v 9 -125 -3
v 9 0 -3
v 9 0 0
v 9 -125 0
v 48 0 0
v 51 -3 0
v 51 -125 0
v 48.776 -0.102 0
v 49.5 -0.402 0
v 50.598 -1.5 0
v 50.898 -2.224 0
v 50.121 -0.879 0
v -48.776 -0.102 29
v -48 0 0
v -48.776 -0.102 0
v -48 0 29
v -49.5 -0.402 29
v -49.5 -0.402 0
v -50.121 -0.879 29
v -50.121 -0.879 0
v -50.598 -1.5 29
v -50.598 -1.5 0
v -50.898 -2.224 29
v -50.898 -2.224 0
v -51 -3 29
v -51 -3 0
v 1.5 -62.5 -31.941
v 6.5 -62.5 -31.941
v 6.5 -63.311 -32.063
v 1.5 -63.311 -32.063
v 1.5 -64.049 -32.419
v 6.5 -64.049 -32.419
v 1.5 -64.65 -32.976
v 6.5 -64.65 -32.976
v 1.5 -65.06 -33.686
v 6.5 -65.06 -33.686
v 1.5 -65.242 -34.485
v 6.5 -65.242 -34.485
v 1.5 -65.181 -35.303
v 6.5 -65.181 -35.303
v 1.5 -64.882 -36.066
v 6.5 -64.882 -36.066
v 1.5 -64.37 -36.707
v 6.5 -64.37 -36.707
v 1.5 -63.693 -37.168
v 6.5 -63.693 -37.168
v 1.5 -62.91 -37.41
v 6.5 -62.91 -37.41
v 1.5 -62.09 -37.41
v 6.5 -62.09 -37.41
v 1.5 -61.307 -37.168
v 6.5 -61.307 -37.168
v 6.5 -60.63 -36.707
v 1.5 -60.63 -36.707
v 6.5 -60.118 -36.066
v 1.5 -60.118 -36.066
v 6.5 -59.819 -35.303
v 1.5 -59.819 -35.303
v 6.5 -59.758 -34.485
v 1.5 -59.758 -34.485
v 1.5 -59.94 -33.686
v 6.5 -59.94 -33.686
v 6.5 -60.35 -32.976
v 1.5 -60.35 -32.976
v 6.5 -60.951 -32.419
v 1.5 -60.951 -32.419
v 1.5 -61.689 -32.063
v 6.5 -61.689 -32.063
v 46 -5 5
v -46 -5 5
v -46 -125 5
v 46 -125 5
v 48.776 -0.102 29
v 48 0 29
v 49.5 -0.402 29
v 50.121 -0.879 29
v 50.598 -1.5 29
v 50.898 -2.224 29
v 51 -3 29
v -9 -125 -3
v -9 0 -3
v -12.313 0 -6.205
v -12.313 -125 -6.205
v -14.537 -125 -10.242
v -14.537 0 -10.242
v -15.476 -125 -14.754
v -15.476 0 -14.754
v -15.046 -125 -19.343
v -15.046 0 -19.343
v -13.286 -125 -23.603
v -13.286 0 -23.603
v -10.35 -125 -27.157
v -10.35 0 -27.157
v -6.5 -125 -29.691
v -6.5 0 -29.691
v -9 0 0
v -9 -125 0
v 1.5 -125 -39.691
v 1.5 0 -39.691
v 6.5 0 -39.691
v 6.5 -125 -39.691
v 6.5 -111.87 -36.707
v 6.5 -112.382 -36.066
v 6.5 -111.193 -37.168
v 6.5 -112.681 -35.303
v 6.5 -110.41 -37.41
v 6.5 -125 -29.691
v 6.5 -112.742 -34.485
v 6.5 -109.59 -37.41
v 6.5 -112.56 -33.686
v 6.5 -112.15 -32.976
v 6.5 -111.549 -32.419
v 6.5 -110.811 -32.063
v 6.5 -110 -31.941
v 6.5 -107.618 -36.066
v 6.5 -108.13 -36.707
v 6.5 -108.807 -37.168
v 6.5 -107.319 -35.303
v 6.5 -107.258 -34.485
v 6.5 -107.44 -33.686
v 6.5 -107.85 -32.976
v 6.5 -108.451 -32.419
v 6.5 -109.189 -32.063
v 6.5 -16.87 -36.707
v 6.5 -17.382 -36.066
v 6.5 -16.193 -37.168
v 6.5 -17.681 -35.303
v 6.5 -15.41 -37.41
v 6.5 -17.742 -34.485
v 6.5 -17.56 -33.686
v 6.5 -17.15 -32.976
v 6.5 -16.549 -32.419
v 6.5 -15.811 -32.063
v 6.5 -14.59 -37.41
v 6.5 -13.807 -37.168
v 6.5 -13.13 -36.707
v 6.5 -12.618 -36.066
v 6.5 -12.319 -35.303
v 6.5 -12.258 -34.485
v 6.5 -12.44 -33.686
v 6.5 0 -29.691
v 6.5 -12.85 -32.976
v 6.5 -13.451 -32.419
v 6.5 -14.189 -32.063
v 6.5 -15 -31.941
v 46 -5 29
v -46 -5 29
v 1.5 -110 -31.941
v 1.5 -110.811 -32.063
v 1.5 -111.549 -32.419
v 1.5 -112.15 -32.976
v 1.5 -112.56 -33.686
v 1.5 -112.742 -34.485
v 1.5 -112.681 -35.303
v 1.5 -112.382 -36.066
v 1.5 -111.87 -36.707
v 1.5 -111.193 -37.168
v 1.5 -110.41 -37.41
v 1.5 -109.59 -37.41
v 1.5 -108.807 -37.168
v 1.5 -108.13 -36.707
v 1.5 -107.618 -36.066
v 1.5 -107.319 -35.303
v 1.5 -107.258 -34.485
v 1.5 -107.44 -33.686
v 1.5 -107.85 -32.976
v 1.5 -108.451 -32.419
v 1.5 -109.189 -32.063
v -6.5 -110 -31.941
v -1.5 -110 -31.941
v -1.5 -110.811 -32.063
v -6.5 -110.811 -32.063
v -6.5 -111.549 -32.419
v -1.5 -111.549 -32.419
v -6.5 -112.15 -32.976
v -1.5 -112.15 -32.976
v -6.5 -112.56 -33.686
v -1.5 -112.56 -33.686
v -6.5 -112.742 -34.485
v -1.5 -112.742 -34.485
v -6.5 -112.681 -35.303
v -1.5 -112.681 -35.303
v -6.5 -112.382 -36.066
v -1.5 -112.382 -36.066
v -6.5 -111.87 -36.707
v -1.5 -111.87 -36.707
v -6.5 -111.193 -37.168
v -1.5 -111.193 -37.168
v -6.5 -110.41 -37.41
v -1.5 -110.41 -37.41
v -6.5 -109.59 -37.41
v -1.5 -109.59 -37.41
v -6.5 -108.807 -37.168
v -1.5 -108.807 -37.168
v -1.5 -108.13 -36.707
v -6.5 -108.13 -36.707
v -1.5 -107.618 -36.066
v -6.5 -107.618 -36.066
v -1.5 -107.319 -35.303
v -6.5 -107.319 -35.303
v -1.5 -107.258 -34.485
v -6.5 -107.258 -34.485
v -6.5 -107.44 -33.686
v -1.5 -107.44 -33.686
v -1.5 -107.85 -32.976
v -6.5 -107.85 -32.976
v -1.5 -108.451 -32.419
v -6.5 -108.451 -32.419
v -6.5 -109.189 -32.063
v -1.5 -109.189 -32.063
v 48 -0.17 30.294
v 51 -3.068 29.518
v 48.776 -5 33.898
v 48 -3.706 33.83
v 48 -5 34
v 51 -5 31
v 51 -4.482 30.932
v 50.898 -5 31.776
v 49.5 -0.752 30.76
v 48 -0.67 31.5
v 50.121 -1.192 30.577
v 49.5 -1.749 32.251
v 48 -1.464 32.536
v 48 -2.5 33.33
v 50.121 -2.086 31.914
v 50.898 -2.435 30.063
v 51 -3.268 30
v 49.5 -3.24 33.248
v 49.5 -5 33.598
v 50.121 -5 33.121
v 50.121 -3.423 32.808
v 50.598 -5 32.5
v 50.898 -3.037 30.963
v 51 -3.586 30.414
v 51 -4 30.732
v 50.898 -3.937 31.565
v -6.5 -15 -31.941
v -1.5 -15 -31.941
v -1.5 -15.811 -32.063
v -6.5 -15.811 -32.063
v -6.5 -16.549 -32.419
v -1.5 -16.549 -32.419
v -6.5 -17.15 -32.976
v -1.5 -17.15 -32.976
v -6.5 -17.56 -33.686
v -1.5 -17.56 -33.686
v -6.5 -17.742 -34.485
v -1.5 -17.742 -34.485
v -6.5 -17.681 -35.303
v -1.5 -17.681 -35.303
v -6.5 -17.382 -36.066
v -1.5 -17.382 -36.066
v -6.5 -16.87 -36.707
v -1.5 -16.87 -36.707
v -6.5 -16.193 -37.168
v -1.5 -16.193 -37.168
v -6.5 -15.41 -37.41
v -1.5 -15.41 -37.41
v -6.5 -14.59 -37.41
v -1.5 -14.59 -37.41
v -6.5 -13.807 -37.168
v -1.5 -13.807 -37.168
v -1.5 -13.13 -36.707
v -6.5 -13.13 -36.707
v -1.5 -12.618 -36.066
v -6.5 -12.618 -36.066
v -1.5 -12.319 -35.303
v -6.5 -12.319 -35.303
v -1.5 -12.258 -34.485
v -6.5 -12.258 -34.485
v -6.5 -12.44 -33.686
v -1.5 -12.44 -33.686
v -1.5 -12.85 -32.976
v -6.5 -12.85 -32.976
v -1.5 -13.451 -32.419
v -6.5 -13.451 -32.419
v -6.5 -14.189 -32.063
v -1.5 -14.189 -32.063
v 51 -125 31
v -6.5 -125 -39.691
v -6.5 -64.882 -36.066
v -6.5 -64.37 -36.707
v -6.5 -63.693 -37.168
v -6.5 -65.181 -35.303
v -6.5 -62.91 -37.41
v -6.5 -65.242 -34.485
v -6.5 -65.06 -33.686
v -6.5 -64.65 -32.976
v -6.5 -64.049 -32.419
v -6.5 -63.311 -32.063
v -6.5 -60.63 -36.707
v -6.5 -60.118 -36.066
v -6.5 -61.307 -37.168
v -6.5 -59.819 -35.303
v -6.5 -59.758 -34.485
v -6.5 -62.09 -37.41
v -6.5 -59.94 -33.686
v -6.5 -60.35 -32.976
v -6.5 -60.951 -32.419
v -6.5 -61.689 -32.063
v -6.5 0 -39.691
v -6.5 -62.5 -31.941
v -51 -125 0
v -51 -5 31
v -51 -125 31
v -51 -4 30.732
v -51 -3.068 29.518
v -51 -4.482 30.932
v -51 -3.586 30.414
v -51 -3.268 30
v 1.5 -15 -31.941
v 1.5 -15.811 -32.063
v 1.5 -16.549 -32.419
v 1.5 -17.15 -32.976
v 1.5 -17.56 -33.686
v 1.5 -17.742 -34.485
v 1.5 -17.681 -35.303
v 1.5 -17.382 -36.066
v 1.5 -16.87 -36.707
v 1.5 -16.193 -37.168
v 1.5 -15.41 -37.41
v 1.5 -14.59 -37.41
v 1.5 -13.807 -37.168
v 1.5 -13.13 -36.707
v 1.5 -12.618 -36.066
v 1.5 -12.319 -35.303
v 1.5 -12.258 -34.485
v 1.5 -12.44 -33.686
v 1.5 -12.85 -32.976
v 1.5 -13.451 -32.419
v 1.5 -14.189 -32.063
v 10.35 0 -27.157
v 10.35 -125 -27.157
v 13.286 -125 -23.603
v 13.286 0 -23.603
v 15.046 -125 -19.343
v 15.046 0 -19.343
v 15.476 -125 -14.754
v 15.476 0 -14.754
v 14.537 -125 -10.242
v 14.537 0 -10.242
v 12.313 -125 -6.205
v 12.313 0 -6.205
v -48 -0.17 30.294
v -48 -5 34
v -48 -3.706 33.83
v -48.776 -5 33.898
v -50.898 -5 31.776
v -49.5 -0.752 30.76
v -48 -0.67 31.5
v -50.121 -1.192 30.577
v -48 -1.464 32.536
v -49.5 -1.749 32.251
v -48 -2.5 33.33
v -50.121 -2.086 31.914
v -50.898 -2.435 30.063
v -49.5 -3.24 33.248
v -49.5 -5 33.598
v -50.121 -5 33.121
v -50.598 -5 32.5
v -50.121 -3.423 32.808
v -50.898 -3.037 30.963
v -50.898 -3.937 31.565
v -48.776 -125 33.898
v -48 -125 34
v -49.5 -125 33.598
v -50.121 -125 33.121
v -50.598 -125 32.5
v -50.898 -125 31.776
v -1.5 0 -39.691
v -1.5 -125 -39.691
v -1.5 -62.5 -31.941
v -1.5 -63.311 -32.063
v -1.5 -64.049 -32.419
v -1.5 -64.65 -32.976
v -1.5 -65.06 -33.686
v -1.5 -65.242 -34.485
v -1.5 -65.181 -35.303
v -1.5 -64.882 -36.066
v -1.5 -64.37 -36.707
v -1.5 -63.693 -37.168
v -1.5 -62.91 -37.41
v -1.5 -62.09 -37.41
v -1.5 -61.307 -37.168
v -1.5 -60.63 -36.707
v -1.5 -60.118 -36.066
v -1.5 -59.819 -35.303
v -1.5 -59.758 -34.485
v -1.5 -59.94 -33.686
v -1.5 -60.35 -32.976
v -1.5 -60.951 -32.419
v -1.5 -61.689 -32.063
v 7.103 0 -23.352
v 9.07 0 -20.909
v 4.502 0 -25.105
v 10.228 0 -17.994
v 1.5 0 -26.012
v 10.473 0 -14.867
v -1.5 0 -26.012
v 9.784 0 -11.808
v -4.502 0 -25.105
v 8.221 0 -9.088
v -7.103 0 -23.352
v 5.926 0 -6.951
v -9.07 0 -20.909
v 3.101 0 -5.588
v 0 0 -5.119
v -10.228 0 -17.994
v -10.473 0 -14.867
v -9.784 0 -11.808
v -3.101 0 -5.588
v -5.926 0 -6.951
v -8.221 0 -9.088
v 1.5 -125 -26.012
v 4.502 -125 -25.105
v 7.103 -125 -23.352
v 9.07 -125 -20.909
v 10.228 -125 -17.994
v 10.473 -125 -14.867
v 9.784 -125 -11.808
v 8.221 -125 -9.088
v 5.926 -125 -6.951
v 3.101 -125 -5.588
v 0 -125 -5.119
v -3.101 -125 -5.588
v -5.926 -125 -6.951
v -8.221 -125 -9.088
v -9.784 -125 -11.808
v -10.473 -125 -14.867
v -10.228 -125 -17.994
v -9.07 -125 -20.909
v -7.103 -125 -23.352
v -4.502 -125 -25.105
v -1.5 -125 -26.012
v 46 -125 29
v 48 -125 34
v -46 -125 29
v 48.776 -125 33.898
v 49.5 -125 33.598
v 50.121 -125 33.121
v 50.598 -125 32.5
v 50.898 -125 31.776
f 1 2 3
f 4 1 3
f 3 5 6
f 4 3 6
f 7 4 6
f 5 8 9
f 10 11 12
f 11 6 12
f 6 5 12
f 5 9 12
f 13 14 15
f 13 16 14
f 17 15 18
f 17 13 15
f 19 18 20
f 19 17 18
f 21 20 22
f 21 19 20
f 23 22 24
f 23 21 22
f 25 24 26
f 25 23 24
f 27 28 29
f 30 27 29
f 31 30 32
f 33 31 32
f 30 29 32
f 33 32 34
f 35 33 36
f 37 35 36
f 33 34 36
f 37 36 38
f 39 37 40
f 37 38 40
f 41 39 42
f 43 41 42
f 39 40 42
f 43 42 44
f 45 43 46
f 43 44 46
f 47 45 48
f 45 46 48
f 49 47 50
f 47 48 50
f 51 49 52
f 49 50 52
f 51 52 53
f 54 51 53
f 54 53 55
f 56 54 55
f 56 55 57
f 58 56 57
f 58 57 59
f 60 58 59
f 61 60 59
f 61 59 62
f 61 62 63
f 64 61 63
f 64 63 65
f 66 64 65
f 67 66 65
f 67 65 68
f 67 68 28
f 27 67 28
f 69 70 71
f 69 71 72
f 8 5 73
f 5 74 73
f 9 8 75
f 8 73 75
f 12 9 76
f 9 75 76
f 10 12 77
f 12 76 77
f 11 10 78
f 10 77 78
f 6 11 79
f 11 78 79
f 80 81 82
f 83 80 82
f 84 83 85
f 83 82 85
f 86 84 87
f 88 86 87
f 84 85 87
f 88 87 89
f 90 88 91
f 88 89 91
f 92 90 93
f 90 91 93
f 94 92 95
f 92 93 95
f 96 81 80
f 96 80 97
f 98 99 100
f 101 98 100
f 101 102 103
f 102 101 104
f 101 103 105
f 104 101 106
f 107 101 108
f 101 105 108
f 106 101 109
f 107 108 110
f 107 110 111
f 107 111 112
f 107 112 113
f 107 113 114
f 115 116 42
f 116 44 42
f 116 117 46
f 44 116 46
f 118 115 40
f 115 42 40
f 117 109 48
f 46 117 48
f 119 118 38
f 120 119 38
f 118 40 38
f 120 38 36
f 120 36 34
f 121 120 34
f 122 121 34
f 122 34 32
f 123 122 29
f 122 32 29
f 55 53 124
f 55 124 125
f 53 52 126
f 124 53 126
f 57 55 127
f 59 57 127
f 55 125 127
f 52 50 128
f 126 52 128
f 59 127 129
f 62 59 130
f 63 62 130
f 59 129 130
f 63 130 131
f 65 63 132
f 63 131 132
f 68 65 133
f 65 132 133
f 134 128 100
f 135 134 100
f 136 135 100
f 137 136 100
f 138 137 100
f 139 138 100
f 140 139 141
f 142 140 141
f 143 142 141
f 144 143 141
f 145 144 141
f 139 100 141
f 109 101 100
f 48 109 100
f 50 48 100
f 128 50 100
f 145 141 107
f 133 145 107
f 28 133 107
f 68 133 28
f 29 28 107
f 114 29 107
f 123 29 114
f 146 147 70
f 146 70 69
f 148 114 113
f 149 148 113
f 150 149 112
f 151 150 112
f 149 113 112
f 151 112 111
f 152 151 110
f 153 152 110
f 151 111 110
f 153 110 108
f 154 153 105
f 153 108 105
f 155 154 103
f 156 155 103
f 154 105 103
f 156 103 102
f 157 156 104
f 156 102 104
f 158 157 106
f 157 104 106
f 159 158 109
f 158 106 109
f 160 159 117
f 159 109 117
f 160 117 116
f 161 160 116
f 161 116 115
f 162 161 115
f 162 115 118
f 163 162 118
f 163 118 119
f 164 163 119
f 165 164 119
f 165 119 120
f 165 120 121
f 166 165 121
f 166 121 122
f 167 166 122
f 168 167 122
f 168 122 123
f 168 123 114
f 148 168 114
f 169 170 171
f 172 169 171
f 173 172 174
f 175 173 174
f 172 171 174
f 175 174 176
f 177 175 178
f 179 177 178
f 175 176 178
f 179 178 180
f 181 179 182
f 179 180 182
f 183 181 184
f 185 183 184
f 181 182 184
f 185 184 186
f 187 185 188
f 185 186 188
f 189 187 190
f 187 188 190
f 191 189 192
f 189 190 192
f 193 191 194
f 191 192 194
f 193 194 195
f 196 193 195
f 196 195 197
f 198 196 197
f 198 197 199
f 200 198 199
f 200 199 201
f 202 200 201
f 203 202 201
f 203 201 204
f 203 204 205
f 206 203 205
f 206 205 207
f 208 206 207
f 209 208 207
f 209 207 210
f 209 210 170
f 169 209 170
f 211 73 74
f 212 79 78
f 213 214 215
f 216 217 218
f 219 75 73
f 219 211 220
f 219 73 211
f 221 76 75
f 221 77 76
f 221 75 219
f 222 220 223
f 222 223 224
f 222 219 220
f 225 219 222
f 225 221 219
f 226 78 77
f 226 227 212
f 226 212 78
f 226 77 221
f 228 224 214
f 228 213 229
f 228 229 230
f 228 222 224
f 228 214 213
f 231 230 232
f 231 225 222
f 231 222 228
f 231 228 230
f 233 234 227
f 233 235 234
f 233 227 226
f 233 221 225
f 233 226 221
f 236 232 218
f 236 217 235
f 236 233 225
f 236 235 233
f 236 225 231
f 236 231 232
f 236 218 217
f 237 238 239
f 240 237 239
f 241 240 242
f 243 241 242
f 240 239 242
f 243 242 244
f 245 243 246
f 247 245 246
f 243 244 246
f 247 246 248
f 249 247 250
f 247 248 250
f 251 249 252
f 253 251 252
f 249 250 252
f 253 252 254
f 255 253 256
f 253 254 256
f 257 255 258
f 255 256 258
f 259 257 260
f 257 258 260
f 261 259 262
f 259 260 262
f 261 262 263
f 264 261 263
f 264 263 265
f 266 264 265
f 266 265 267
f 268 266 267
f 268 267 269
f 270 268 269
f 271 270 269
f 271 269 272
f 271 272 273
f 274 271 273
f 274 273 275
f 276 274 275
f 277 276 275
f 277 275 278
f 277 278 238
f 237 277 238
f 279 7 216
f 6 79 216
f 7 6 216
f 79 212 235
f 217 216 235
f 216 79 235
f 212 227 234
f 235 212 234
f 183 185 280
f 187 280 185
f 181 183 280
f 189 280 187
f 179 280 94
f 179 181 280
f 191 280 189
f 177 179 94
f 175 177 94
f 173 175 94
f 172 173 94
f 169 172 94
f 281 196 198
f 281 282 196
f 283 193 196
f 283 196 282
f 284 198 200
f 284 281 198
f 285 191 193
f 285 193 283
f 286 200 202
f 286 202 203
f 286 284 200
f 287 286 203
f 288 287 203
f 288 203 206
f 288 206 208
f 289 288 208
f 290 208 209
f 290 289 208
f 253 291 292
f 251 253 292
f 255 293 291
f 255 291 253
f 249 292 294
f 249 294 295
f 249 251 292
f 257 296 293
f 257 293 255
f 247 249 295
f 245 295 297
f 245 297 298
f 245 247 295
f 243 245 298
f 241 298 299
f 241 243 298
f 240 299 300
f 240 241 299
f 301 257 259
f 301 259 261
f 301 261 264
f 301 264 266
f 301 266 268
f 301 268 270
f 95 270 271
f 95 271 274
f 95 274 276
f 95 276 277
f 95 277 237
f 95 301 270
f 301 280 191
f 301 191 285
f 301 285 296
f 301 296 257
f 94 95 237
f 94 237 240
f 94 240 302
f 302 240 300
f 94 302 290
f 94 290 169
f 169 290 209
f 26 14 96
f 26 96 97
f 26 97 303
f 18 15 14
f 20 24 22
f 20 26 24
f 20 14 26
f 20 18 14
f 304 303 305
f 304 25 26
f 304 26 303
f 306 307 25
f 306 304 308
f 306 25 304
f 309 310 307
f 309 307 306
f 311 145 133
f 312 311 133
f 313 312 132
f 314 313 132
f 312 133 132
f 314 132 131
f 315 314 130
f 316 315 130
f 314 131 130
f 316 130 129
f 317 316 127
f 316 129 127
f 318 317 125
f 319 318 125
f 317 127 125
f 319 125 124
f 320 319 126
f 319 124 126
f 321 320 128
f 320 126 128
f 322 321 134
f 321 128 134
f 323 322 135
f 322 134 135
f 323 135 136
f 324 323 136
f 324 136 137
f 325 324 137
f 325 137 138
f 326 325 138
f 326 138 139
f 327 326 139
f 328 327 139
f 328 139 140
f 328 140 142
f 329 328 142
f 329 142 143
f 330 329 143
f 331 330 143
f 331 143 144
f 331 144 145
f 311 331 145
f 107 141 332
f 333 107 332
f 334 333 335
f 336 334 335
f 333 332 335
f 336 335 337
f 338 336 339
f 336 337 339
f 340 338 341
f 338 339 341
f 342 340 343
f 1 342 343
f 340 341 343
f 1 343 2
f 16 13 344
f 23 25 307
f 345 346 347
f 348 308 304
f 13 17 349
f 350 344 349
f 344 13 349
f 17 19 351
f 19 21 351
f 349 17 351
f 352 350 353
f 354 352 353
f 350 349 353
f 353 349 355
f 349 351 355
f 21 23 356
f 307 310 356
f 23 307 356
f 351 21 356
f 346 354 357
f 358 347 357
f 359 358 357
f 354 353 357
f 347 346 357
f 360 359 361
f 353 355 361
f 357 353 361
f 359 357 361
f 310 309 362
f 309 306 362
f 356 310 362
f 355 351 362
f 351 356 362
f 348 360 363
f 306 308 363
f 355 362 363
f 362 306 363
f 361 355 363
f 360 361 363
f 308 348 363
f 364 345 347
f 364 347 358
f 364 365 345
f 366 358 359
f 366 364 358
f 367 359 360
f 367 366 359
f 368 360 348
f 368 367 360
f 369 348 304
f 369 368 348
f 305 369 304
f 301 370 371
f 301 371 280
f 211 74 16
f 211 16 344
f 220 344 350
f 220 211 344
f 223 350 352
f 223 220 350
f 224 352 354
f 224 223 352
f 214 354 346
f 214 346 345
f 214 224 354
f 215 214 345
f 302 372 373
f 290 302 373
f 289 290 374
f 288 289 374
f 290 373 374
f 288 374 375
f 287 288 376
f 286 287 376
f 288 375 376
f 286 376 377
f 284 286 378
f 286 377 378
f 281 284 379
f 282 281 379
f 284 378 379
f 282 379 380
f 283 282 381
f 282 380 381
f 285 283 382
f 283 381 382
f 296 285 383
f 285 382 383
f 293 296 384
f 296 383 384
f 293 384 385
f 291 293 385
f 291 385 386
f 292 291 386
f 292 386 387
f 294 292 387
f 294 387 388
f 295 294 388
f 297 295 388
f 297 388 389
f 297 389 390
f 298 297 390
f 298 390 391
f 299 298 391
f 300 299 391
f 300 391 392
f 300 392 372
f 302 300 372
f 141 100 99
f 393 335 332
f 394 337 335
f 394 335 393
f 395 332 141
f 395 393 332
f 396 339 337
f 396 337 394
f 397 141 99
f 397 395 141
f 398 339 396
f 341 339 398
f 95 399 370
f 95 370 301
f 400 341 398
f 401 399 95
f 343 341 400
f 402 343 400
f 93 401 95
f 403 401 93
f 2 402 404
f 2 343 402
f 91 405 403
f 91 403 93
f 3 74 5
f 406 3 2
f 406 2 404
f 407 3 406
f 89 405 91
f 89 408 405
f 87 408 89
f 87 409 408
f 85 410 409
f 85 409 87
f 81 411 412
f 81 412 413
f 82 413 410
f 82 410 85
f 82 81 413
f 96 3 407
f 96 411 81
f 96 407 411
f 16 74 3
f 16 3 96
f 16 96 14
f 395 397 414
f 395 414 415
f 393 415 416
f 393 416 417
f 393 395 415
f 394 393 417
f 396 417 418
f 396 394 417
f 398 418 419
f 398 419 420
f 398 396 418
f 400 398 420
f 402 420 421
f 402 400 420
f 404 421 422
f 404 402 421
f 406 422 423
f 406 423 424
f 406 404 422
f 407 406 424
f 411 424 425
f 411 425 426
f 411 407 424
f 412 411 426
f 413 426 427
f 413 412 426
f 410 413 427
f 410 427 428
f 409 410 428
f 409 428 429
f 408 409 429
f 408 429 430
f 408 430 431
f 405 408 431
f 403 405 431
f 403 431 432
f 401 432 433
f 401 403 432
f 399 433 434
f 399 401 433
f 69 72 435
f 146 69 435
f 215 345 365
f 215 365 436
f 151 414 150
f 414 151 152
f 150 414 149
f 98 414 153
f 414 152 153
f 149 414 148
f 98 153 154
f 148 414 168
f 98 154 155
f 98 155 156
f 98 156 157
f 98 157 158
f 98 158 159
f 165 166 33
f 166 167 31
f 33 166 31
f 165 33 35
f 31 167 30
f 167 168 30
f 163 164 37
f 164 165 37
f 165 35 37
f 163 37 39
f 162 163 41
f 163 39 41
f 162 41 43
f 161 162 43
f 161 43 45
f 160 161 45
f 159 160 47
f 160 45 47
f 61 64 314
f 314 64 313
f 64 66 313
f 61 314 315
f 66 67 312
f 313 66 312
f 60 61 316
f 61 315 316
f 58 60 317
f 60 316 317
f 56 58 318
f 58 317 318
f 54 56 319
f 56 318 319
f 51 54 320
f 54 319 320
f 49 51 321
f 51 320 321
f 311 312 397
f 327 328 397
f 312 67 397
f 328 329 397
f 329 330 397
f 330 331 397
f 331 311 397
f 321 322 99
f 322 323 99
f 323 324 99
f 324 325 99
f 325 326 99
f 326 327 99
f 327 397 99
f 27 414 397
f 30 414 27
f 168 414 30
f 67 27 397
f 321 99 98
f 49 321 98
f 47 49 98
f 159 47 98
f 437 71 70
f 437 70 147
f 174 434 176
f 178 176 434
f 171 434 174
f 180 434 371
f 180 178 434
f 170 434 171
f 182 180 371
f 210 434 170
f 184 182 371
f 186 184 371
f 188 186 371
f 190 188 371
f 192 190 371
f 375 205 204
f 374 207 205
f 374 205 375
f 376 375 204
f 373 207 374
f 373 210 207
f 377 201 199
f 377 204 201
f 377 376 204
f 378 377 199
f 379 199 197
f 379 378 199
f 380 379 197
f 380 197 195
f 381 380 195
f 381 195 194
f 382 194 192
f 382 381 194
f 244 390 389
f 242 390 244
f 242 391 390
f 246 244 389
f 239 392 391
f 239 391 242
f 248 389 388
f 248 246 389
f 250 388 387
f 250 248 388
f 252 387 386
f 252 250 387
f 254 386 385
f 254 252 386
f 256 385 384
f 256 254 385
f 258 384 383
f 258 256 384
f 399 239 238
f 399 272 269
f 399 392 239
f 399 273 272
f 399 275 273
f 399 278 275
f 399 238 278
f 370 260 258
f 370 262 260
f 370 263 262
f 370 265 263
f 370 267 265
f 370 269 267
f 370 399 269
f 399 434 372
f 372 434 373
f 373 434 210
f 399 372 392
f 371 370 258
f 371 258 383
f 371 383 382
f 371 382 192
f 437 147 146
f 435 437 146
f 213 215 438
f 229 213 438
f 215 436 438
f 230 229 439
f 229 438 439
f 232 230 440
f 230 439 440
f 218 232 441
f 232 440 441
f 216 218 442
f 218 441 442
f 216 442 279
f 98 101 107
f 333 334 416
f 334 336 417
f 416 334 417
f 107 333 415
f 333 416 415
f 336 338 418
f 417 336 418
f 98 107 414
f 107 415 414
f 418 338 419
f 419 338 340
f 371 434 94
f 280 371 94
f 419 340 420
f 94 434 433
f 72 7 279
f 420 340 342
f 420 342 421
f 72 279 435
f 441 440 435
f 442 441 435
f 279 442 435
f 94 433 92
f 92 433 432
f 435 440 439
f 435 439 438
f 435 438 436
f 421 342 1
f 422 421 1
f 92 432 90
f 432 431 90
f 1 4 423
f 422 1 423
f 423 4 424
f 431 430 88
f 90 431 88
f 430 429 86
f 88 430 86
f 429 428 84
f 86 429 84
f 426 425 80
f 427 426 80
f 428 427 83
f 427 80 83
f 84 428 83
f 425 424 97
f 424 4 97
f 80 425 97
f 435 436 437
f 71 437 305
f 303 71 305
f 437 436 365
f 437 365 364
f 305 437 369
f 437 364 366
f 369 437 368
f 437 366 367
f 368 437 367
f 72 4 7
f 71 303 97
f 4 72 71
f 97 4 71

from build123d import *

# Parameters (mm, degrees)
PAD_DEPTH       = 125
SKETCH001_W     = 92
SKETCH001_H     = 24
POCKET_DEPTH    = 120
FILLET_R        = 5
FILLET001_R     = 3
FILLET002_R     = 3
SKETCH002_R     = 2.75
POCKET001_DEPTH = 57.501


with BuildPart() as part:
    # Sketch → Pad (new body)
    with BuildSketch(Plane.XZ):
        with BuildLine():
            ThreePointArc((1.5, -26.011734), (0, -5.119429), (-1.5, -26.011734))
            Line((-1.5, -26.011734), (-1.5, -39.690677))
            Line((-1.5, -39.690677), (-6.5, -39.690677))
            Line((-6.5, -39.690677), (-6.5, -29.690677))
            ThreePointArc((-9, -3), (-15.432451, -17.06492), (-6.5, -29.690677))
            Line((-9, -3), (-9, 0))
            Line((-9, 0), (-51, 0))
            Line((-51, 0), (-51, 34))
            Line((-51, 34), (51, 34))
            Line((51, 0), (51, 34))
            Line((9, 0), (51, 0))
            Line((9, -3), (9, 0))
            ThreePointArc((6.5, -29.690677), (15.432451, -17.06492), (9, -3))
            Line((6.5, -39.690677), (6.5, -29.690677))
            Line((1.5, -39.690677), (6.5, -39.690677))
            Line((1.5, -26.011734), (1.5, -39.690677))
        make_face()
    extrude(amount=PAD_DEPTH)

    # Sketch001 (on Face18 of Pad) → Pocket (cut)
    with BuildSketch(Plane.XZ.offset(125)):
        with Locations((0, 17)):
            Rectangle(SKETCH001_W, SKETCH001_H)
    extrude(amount=-POCKET_DEPTH, mode=Mode.SUBTRACT)

    # Fillet
    fillet_edges = [part.edges().sort_by_distance(p)[0] for p in [
        (0, 0, 34),
    ]]
    fillet(fillet_edges, radius=FILLET_R)

    # Fillet001
    fillet001_edges = [part.edges().sort_by_distance(p)[0] for p in [
        (51, 0, 14.5),
    ]]
    fillet(fillet001_edges, radius=FILLET001_R)

    # Fillet002
    fillet002_edges = [part.edges().sort_by_distance(p)[0] for p in [
        (-51, 0, 14.5),
    ]]
    fillet(fillet002_edges, radius=FILLET002_R)

    # Sketch002 (on Face12 of Fillet002) → Pocket001 (cut, through all)
    with BuildSketch(Plane(origin=(6.5, 0, 0), x_dir=(0, 0, 1), z_dir=(1, 0, 0))):
        with Locations((-34.690677, 110)):
            Circle(SKETCH002_R)
        with Locations((-34.690677, 62.5)):
            Circle(SKETCH002_R)
        with Locations((-34.690677, 15)):
            Circle(SKETCH002_R)
    extrude(amount=-POCKET001_DEPTH, mode=Mode.SUBTRACT)


solid = part.part
